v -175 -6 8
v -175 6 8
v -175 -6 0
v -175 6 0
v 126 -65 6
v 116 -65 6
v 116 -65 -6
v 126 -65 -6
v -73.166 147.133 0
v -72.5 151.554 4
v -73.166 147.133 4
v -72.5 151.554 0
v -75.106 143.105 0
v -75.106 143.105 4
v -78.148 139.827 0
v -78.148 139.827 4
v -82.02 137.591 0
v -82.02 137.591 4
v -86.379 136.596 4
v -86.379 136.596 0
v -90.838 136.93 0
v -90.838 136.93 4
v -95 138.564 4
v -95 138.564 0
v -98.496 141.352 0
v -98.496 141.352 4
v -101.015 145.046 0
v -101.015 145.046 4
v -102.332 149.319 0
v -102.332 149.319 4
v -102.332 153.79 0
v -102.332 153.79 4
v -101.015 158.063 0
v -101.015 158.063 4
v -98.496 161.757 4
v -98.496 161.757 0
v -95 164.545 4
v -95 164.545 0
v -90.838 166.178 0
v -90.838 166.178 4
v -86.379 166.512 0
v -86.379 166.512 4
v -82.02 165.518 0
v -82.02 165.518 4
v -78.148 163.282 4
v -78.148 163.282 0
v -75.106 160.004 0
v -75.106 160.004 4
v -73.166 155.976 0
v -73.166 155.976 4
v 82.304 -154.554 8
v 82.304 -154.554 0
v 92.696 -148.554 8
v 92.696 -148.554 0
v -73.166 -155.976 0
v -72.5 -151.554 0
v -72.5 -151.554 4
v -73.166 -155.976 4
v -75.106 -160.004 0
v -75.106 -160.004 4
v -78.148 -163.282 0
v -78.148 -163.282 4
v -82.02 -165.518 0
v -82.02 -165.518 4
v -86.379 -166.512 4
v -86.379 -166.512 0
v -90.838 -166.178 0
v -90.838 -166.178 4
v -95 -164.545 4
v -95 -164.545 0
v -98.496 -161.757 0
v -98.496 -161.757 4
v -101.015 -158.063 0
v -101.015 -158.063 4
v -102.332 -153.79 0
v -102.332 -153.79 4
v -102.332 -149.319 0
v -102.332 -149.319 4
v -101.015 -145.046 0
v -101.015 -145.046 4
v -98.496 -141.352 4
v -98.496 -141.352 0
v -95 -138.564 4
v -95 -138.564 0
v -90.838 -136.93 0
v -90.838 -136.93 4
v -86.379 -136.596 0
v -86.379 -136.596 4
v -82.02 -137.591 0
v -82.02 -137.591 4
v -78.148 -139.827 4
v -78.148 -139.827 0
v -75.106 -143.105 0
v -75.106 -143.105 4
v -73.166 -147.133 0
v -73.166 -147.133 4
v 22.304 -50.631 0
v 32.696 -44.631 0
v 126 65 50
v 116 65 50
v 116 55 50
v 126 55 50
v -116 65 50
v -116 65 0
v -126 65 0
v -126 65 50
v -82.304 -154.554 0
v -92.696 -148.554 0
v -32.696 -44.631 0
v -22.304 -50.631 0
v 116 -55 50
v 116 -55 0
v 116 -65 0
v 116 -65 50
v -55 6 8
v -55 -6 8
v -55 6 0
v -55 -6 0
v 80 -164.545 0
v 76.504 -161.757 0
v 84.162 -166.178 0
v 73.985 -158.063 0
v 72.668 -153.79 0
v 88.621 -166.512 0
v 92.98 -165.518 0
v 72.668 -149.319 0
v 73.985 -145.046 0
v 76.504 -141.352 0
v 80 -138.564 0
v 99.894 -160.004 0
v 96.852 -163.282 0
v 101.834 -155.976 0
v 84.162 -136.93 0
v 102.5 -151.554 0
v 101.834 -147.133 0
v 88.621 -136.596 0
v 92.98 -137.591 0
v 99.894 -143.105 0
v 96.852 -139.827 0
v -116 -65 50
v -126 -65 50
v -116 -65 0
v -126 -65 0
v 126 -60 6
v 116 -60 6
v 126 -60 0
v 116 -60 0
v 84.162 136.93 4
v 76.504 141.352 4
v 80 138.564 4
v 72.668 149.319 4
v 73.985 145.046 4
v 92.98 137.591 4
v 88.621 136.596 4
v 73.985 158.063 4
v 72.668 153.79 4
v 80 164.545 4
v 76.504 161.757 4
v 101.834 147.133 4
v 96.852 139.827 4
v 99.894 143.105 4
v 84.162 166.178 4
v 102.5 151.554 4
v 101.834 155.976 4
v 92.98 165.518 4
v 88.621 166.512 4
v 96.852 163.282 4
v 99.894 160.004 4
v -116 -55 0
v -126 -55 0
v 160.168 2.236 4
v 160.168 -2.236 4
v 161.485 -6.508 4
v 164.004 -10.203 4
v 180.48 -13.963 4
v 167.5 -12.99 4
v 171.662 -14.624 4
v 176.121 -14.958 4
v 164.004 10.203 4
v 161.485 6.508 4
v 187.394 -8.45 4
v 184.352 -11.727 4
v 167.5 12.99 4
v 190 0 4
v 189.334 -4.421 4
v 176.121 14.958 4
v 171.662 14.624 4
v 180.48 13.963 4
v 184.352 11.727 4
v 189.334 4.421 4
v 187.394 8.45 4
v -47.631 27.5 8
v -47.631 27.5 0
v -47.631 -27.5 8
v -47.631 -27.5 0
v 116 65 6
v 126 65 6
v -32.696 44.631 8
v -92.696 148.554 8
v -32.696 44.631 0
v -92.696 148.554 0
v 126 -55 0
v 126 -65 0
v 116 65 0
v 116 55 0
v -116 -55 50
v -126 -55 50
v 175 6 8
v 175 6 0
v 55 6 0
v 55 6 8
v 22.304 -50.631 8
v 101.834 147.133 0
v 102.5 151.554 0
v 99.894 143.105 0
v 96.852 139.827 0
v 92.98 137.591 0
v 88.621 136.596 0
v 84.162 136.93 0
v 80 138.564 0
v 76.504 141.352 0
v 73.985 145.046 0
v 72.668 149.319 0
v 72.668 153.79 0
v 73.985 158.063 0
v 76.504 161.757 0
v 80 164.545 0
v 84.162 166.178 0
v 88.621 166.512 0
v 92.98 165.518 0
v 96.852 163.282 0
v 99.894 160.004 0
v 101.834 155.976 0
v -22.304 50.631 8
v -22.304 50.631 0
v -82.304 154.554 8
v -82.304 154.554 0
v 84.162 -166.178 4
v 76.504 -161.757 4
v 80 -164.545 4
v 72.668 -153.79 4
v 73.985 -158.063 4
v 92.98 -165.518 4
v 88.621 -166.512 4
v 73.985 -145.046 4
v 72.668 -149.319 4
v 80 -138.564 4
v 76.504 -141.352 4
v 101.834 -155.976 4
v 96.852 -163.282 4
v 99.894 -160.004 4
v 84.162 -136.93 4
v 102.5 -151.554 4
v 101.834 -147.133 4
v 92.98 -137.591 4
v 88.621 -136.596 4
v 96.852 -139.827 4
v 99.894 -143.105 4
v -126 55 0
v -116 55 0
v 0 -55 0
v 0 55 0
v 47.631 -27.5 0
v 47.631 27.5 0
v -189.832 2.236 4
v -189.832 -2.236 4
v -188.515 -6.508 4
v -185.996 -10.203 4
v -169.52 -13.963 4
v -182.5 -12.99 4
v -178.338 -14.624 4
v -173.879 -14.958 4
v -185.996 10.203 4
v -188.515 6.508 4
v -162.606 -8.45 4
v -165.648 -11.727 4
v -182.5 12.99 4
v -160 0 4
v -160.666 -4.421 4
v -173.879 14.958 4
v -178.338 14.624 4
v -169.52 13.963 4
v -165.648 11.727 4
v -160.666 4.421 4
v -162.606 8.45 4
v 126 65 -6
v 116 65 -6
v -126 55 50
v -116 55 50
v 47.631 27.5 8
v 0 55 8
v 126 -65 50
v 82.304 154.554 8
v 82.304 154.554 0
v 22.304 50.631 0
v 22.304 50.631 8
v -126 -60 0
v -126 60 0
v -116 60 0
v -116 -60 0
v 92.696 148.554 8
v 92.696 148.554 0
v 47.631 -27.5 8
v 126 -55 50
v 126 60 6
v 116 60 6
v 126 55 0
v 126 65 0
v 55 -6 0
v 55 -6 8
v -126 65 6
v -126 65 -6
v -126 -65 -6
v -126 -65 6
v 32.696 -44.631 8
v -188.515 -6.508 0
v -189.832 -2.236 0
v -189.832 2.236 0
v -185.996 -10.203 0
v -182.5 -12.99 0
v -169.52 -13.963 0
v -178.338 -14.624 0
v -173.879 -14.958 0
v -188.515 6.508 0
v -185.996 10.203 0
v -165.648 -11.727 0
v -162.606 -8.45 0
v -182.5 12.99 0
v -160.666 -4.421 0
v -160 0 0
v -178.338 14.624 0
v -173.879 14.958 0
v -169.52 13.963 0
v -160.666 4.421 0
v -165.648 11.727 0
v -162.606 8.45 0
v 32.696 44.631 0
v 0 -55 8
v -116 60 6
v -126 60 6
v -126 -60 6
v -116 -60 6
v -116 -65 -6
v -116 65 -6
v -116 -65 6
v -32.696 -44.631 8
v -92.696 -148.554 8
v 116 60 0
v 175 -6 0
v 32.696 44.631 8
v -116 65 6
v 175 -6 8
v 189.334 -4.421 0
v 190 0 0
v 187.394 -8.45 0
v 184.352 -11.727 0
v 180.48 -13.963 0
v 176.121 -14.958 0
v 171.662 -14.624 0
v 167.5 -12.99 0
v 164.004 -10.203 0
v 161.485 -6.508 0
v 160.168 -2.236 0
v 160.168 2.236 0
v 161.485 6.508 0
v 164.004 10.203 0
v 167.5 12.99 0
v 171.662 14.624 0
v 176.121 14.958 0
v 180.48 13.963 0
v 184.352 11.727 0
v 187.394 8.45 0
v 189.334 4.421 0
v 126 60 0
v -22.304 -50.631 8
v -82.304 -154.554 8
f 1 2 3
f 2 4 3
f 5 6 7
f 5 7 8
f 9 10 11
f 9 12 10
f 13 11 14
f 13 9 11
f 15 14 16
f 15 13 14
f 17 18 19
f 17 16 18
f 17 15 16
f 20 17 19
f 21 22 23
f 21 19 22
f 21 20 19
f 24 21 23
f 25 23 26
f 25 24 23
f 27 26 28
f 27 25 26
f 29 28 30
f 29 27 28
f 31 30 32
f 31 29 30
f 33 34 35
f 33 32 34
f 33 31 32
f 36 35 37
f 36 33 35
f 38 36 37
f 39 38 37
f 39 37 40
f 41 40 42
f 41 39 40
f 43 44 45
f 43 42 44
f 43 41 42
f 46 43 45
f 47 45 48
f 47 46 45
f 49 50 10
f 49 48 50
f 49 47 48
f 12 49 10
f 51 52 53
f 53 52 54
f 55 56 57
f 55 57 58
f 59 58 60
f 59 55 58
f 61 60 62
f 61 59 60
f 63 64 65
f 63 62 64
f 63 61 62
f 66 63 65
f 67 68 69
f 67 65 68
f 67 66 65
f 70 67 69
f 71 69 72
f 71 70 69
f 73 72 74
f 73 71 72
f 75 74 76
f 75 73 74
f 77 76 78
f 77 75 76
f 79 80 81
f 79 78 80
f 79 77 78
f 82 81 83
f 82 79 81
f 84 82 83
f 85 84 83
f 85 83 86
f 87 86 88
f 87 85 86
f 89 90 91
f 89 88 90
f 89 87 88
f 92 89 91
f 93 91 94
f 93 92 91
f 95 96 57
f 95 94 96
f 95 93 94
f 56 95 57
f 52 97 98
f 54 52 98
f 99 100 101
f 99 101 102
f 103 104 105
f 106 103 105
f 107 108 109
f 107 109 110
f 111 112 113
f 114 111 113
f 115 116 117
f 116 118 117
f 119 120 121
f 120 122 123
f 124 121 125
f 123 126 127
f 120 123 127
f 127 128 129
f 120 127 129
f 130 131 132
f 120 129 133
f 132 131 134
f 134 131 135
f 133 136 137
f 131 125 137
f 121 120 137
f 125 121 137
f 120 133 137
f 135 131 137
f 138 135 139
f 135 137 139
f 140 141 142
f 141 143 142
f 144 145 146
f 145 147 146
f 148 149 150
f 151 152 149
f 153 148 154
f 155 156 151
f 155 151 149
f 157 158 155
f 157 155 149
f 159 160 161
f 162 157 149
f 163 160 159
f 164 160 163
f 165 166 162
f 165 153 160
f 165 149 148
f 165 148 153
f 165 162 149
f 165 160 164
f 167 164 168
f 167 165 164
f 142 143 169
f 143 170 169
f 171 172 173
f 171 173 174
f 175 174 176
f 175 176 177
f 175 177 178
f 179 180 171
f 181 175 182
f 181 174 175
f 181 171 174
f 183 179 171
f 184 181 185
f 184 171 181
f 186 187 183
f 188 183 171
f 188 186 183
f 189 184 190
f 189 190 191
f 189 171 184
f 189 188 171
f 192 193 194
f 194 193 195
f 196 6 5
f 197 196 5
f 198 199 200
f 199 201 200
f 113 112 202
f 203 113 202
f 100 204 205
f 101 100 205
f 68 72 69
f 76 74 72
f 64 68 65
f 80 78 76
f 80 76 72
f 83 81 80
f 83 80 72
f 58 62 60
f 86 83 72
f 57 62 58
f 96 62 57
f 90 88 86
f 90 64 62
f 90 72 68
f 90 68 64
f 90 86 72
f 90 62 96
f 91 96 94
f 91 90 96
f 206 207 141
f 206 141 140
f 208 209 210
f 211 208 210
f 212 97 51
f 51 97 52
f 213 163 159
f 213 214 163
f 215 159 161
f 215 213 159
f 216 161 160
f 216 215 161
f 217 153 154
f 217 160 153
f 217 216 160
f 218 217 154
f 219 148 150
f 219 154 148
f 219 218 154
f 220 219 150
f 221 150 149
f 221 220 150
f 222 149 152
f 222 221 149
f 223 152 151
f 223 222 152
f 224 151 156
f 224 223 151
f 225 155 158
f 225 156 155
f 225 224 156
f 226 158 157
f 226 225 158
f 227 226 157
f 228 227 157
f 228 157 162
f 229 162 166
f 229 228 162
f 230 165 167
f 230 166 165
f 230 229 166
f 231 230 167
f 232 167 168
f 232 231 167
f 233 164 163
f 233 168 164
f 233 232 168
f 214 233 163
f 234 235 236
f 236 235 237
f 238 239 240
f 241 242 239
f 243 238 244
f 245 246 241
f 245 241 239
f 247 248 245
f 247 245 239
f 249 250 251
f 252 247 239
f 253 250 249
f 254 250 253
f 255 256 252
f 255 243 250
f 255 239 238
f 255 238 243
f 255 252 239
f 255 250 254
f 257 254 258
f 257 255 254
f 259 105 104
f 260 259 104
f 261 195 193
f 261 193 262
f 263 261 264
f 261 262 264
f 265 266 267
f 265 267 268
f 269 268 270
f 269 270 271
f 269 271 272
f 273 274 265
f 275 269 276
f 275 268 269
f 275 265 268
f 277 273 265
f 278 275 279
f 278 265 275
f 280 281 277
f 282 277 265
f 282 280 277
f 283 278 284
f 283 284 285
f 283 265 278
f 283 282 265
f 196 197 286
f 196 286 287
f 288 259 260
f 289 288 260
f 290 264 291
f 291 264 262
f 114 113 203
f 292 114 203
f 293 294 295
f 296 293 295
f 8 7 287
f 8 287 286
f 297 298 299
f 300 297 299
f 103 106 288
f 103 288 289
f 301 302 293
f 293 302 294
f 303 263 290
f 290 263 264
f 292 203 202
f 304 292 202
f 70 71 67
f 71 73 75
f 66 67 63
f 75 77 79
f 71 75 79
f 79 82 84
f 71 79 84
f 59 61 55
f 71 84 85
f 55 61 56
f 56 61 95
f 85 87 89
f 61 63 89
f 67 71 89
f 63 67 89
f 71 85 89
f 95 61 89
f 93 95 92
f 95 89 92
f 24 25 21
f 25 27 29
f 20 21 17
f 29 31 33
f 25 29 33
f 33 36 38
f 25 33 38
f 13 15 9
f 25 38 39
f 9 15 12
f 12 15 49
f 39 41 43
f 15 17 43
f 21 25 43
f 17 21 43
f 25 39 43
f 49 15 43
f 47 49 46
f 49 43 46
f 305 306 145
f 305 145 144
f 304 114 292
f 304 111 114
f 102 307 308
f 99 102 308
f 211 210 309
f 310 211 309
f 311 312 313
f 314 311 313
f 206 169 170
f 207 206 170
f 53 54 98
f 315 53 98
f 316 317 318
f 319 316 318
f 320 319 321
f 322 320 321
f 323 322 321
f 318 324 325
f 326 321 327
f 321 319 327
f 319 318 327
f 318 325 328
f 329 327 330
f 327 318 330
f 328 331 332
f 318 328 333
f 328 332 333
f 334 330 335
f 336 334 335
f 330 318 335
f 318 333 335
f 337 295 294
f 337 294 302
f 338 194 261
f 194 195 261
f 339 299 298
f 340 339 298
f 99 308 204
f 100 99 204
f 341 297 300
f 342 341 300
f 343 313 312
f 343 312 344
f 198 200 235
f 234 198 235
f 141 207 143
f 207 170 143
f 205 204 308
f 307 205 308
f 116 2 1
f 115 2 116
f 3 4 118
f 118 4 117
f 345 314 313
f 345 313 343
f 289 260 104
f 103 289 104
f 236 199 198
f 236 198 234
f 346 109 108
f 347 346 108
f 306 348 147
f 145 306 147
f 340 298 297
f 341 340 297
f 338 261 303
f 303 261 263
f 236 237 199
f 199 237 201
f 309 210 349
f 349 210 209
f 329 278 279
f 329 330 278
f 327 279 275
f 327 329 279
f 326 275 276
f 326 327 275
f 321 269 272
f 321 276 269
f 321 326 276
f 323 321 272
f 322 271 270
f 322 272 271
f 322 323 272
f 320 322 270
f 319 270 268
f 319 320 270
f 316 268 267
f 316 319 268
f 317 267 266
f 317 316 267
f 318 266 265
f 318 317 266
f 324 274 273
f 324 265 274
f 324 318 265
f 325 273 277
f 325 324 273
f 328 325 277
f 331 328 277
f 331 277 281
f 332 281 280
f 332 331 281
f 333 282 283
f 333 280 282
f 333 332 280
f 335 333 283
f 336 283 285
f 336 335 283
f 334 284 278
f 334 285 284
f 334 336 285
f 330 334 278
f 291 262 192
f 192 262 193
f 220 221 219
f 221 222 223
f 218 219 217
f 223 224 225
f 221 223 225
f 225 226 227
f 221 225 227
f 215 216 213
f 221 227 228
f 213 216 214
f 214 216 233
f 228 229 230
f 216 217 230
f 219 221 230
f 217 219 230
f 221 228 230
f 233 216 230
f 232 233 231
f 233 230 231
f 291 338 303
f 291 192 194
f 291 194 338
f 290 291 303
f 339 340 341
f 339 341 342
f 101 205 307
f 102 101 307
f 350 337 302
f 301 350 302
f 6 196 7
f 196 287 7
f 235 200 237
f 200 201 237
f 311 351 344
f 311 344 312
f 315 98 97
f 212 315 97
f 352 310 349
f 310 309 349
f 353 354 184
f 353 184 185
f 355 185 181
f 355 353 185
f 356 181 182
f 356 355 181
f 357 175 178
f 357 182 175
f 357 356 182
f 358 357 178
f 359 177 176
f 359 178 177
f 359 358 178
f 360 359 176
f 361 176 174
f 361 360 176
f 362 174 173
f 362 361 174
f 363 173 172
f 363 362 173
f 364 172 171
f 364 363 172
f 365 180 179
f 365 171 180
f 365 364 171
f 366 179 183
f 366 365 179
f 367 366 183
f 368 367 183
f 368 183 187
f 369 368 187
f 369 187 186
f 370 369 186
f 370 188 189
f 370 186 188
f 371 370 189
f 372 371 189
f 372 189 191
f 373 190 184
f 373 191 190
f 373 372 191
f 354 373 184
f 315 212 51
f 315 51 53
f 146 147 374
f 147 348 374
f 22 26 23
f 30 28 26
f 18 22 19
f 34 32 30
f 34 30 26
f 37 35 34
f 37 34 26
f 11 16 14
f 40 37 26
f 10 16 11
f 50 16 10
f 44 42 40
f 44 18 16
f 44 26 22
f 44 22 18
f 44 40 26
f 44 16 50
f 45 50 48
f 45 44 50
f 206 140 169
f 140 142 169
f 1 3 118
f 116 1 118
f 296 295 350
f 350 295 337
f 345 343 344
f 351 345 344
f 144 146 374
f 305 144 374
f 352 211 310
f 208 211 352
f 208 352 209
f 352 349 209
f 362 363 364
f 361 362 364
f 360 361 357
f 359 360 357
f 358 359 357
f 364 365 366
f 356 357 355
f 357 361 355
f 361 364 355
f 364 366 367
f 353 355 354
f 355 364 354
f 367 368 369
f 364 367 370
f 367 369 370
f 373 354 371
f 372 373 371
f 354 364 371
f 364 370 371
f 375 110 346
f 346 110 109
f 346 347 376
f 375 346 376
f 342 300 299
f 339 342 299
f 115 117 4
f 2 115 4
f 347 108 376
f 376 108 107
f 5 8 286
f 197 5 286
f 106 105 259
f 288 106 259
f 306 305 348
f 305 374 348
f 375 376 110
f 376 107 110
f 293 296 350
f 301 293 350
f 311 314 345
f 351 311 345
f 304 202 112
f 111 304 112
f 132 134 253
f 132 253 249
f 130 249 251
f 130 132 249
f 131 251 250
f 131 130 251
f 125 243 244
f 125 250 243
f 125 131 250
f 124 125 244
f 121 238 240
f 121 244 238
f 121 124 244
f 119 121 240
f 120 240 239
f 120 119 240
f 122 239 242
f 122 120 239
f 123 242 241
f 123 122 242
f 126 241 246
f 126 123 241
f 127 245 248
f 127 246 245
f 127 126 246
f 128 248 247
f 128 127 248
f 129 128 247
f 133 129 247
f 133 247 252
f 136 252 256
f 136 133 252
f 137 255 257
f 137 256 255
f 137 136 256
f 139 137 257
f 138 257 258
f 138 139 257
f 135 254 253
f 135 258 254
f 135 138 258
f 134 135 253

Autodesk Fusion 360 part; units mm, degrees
sketch "Sketch1" plane through (0, 0, 0) normal (0, 0, 1) x (1, 0, 0)
  line L0 (47.6314, 27.5) -> (0, 55)
  line L1 (0, 55) -> (-47.6314, 27.5)
  line L2 (-47.6314, 27.5) -> (-47.6314, -27.5)
  line L3 (-47.6314, -27.5) -> (0, -55)
  line L4 (0, -55) -> (47.6314, -27.5)
  line L5 (47.6314, -27.5) -> (47.6314, 27.5)
extrude "Extrude1" add sketch "Sketch1" along normal blind 8 makes body 1
sketch "Sketch2" plane through (0, 0, 0) normal (0, 0, 1) x (1, 0, 0)
  line L0 (55, 6) -> (55, -6)
  line L1 (55, -6) -> (175, -6)
  line L2 (175, -6) -> (175, 6)
  line L3 (175, 6) -> (55, 6)
extrude "Extrude2" add sketch "Sketch2" along normal blind 8 separate body makes body 2
sketch "Sketch3" plane through (0, 0, 0) normal (0, 0, 1) x (1, 0, 0)
  circle A0 centre (175, 0) radius 15
extrude "Extrude3" add sketch "Sketch3" along normal blind 4 separate body makes body 3
sketch "Sketch4" plane through (0, 0, 0) normal (0, 0, 1) x (1, 0, 0)
  line L0 (22.3038, 50.6314) -> (32.6962, 44.6314)
  line L1 (32.6962, 44.6314) -> (92.6962, 148.5544)
  line L2 (92.6962, 148.5544) -> (82.3038, 154.5544)
  line L3 (82.3038, 154.5544) -> (22.3038, 50.6314)
extrude "Extrude4" add sketch "Sketch4" along normal blind 8 separate body makes body 4
sketch "Sketch5" plane through (0, 0, 0) normal (0, 0, 1) x (1, 0, 0)
  circle A0 centre (87.5, 151.5544) radius 15
extrude "Extrude5" add sketch "Sketch5" along normal blind 4 separate body makes body 5
sketch "Sketch6" plane through (0, 0, 0) normal (0, 0, 1) x (1, 0, 0)
  line L0 (-32.6962, 44.6314) -> (-22.3038, 50.6314)
  line L1 (-22.3038, 50.6314) -> (-82.3038, 154.5544)
  line L2 (-82.3038, 154.5544) -> (-92.6962, 148.5544)
  line L3 (-92.6962, 148.5544) -> (-32.6962, 44.6314)
extrude "Extrude6" add sketch "Sketch6" along normal blind 8 separate body makes body 6
sketch "Sketch7" plane through (0, 0, 0) normal (0, 0, 1) x (1, 0, 0)
  circle A0 centre (-87.5, 151.5544) radius 15
extrude "Extrude7" add sketch "Sketch7" along normal blind 4 separate body makes body 7
sketch "Sketch8" plane through (0, 0, 0) normal (0, 0, 1) x (1, 0, 0)
  line L0 (-55, -6) -> (-55, 6)
  line L1 (-55, 6) -> (-175, 6)
  line L2 (-175, 6) -> (-175, -6)
  line L3 (-175, -6) -> (-55, -6)
extrude "Extrude8" add sketch "Sketch8" along normal blind 8 separate body makes body 8
sketch "Sketch9" plane through (0, 0, 0) normal (0, 0, 1) x (1, 0, 0)
  circle A0 centre (-175, 0) radius 15
extrude "Extrude9" add sketch "Sketch9" along normal blind 4 separate body makes body 9
sketch "Sketch10" plane through (0, 0, 0) normal (0, 0, 1) x (1, 0, 0)
  line L0 (-22.3038, -50.6314) -> (-32.6962, -44.6314)
  line L1 (-32.6962, -44.6314) -> (-92.6962, -148.5544)
  line L2 (-92.6962, -148.5544) -> (-82.3038, -154.5544)
  line L3 (-82.3038, -154.5544) -> (-22.3038, -50.6314)
extrude "Extrude10" add sketch "Sketch10" along normal blind 8 separate body makes body 10
sketch "Sketch11" plane through (0, 0, 0) normal (0, 0, 1) x (1, 0, 0)
  circle A0 centre (-87.5, -151.5544) radius 15
extrude "Extrude11" add sketch "Sketch11" along normal blind 4 separate body makes body 11
sketch "Sketch12" plane through (0, 0, 0) normal (0, 0, 1) x (1, 0, 0)
  line L0 (32.6962, -44.6314) -> (22.3038, -50.6314)
  line L1 (22.3038, -50.6314) -> (82.3038, -154.5544)
  line L2 (82.3038, -154.5544) -> (92.6962, -148.5544)
  line L3 (92.6962, -148.5544) -> (32.6962, -44.6314)
extrude "Extrude12" add sketch "Sketch12" along normal blind 8 separate body makes body 12
sketch "Sketch13" plane through (0, 0, 0) normal (0, 0, 1) x (1, 0, 0)
  circle A0 centre (87.5, -151.5544) radius 15
extrude "Extrude13" add sketch "Sketch13" along normal blind 4 separate body makes body 13
sketch "Sketch14" plane through (0, 0, 0) normal (0, 0, 1) x (1, 0, 0)
  line L0 (-126, 55) -> (-116, 55)
  line L1 (-116, 55) -> (-116, 65)
  line L2 (-116, 65) -> (-126, 65)
  line L3 (-126, 65) -> (-126, 55)
extrude "Extrude14" add sketch "Sketch14" along normal blind 50 separate body makes body 14
sketch "Sketch15" plane through (0, 0, 0) normal (0, 0, 1) x (1, 0, 0)
  line L0 (-126, -65) -> (-116, -65)
  line L1 (-116, -65) -> (-116, -55)
  line L2 (-116, -55) -> (-126, -55)
  line L3 (-126, -55) -> (-126, -65)
extrude "Extrude15" add sketch "Sketch15" along normal blind 50 separate body makes body 15
sketch "Sketch16" plane through (0, 0, 0) normal (0, 0, 1) x (1, 0, 0)
  line L0 (-126, -65) -> (-116, -65)
  line L1 (-116, -65) -> (-116, 65)
  line L2 (-116, 65) -> (-126, 65)
  line L3 (-126, 65) -> (-126, -65)
extrude "Extrude16" add sketch "Sketch16" along normal mid plane 12 separate body makes body 16
sketch "Sketch17" plane through (0, 0, 0) normal (0, 0, 1) x (1, 0, 0)
  line L0 (-126, -60) -> (-116, -60)
  line L1 (-116, -60) -> (-116, 60)
  line L2 (-116, 60) -> (-126, 60)
  line L3 (-126, 60) -> (-126, -60)
extrude "Extrude17" add sketch "Sketch17" along normal blind 6 separate body makes body 17
sketch "Sketch18" plane through (0, 0, 0) normal (0, 0, 1) x (1, 0, 0)
  line L0 (116, 55) -> (126, 55)
  line L1 (126, 55) -> (126, 65)
  line L2 (126, 65) -> (116, 65)
  line L3 (116, 65) -> (116, 55)
extrude "Extrude18" add sketch "Sketch18" along normal blind 50 separate body makes body 18
sketch "Sketch19" plane through (0, 0, 0) normal (0, 0, 1) x (1, 0, 0)
  line L0 (116, -65) -> (126, -65)
  line L1 (126, -65) -> (126, -55)
  line L2 (126, -55) -> (116, -55)
  line L3 (116, -55) -> (116, -65)
extrude "Extrude19" add sketch "Sketch19" along normal blind 50 separate body makes body 19
sketch "Sketch20" plane through (0, 0, 0) normal (0, 0, 1) x (1, 0, 0)
  line L0 (116, -65) -> (126, -65)
  line L1 (126, -65) -> (126, 65)
  line L2 (126, 65) -> (116, 65)
  line L3 (116, 65) -> (116, -65)
extrude "Extrude20" add sketch "Sketch20" along normal mid plane 12 separate body makes body 20
sketch "Sketch21" plane through (0, 0, 0) normal (0, 0, 1) x (1, 0, 0)
  line L0 (116, -60) -> (126, -60)
  line L1 (126, -60) -> (126, 60)
  line L2 (126, 60) -> (116, 60)
  line L3 (116, 60) -> (116, -60)
extrude "Extrude21" add sketch "Sketch21" along normal blind 6 separate body makes body 21
